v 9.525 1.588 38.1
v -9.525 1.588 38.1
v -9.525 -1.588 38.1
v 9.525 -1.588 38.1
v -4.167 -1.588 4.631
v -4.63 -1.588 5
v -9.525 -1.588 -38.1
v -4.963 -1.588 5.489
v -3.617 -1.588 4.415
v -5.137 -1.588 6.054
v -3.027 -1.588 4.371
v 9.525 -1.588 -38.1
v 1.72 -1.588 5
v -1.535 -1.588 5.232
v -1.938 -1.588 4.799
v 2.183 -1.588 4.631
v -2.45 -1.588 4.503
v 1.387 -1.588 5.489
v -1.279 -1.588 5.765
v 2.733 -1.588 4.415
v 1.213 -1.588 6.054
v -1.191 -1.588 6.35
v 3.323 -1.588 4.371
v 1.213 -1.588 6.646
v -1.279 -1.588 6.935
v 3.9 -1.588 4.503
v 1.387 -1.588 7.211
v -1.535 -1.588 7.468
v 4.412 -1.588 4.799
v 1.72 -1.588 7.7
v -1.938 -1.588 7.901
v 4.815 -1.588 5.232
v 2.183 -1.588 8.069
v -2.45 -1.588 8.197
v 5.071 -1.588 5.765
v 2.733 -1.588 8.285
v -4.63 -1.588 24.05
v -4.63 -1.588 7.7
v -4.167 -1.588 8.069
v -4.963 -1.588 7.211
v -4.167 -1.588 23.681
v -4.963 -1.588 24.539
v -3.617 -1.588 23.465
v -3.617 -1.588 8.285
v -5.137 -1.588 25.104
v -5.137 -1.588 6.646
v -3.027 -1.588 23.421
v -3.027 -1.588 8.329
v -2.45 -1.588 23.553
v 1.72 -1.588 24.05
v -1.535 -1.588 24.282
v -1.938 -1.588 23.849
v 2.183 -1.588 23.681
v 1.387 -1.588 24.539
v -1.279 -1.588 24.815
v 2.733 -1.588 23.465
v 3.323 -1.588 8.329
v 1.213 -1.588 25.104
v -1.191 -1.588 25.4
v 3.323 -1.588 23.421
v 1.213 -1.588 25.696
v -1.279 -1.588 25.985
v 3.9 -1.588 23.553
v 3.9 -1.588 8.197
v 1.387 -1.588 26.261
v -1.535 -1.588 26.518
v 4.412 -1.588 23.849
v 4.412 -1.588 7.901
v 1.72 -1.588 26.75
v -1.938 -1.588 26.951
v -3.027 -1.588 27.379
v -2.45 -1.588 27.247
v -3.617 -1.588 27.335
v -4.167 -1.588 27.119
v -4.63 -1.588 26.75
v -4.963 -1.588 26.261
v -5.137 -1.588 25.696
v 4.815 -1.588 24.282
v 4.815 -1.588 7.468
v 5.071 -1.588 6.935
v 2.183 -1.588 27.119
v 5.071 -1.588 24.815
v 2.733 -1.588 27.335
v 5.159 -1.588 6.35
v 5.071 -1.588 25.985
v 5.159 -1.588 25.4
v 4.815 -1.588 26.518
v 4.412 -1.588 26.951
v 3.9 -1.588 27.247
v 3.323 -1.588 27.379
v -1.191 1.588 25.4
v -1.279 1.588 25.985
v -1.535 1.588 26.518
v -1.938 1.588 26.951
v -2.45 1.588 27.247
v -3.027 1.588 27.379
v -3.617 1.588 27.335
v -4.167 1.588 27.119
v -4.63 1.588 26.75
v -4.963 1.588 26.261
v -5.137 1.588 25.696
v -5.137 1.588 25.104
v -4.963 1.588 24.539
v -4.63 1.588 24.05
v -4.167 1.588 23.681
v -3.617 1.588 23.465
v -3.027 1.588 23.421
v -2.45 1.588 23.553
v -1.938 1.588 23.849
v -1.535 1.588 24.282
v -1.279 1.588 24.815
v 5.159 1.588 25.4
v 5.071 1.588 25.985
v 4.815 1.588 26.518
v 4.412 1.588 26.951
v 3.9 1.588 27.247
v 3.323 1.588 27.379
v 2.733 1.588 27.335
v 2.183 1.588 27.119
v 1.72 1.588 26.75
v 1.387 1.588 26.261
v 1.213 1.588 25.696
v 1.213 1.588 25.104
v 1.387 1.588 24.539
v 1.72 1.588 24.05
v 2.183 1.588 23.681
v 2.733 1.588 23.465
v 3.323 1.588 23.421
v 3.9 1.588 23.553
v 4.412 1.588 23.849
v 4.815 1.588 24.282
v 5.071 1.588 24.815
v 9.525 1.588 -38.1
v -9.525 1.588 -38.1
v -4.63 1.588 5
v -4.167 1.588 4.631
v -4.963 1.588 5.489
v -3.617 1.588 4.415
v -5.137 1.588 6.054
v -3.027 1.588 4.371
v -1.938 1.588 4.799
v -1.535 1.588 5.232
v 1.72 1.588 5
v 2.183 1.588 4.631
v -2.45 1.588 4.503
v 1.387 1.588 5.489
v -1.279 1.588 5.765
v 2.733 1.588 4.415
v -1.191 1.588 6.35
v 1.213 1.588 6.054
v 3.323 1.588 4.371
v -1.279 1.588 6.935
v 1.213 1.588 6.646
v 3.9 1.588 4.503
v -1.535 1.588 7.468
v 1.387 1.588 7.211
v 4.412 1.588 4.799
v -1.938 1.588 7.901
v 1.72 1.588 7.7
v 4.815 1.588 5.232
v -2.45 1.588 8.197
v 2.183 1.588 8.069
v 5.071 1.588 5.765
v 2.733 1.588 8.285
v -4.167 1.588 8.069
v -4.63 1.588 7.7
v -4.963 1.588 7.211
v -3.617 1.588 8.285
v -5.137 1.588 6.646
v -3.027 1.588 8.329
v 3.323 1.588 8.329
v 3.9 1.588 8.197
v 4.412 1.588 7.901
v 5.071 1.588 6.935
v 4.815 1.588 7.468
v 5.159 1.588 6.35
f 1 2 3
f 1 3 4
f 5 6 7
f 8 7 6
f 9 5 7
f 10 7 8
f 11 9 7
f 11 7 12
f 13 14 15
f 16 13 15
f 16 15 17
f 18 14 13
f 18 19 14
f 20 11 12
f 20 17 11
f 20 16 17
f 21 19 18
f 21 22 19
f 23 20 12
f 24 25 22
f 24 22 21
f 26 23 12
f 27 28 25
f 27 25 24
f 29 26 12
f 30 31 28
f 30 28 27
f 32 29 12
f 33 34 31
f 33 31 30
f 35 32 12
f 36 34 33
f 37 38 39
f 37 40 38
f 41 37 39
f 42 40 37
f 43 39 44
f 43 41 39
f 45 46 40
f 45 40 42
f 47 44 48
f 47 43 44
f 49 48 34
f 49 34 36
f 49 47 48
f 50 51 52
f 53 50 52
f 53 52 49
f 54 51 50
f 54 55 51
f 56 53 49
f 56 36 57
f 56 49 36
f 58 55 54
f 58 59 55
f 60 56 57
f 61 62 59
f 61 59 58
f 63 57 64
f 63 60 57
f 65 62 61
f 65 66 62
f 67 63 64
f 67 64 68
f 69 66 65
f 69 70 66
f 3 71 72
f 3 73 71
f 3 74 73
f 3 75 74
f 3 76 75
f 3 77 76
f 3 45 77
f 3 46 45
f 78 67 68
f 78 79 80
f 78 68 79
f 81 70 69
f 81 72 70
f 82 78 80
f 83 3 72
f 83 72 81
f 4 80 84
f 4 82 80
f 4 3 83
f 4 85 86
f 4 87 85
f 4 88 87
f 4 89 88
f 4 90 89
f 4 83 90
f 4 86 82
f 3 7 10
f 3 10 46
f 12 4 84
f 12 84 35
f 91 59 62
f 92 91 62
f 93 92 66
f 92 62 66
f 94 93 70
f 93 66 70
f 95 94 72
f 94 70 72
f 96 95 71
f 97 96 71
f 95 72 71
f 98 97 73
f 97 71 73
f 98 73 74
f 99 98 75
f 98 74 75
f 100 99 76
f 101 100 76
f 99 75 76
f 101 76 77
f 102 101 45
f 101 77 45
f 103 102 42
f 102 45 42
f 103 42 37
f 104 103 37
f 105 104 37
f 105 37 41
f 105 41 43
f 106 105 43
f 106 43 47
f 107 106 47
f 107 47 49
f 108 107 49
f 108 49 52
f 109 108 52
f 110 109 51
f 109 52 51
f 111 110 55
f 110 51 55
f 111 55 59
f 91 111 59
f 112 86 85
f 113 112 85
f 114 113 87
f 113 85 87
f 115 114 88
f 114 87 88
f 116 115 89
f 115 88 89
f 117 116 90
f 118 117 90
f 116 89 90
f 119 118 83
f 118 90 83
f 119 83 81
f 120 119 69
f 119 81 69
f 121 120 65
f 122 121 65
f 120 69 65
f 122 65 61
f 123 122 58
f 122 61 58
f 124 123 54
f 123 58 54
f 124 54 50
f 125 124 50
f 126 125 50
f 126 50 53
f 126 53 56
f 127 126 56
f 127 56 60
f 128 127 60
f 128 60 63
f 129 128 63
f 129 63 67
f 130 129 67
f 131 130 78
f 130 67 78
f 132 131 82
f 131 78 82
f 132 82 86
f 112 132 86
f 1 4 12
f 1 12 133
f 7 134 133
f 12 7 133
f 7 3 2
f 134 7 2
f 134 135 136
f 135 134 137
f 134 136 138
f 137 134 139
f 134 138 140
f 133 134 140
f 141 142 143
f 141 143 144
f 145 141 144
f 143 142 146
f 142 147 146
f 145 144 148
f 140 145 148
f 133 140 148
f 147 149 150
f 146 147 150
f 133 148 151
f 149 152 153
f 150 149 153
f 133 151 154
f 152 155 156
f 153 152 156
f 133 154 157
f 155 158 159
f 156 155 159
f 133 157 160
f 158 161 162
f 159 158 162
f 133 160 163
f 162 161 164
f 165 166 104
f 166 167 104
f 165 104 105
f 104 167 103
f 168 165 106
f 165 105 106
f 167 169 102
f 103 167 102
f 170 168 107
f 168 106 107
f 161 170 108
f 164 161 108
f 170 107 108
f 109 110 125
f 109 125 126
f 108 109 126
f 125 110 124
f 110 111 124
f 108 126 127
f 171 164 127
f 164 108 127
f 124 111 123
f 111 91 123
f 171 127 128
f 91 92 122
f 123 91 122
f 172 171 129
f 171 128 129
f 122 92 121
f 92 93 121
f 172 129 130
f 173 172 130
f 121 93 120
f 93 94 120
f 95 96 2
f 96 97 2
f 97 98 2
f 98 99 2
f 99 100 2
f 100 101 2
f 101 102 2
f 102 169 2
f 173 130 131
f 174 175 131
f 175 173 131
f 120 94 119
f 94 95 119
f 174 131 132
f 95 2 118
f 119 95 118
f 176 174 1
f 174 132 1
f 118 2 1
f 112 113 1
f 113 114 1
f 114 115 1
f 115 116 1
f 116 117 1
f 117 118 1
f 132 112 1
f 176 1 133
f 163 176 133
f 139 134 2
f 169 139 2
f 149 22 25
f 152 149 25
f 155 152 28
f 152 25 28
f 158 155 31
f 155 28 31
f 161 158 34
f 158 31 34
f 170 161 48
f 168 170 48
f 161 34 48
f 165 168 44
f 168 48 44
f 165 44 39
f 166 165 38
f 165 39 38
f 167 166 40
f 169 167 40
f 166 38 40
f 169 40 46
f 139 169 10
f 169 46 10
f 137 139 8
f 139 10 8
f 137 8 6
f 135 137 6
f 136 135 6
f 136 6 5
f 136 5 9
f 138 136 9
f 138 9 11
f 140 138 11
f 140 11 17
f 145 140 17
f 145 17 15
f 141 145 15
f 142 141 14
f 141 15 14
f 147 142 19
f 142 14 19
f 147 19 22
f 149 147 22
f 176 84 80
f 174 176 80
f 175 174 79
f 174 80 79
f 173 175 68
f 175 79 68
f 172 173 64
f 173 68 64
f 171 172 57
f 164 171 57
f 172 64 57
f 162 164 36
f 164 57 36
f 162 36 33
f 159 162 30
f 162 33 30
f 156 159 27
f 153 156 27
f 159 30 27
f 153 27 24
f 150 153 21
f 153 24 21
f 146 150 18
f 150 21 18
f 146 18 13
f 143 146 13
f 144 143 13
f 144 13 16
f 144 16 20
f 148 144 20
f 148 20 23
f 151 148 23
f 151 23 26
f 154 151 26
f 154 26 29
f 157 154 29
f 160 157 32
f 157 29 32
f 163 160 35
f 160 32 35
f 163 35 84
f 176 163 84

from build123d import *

# Parameters (mm, degrees)
F0_W     = 19.05
F0_H     = 3.175
F1_DEPTH = 38.1
F2_R     = 1.984375
F3_DEPTH = 3.175


with BuildPart() as f1:
    # F0 (on Top) → F1 (new body, symmetric)
    with BuildSketch(Plane.XY):
        Rectangle(F0_W, F0_H)
    extrude(amount=F1_DEPTH, both=True)

    # F2 (on face) → F3 (cut, through all)
    with BuildSketch(Plane.XZ.offset(1.5875)):
        with Locations((3.175, 25.4)):
            Circle(F2_R)
        with Locations((-3.175, 25.4)):
            Circle(F2_R)
        with Locations((3.175, 6.35)):
            Circle(F2_R)
        with Locations((-3.175, 6.35)):
            Circle(F2_R)
    extrude(amount=-F3_DEPTH, mode=Mode.SUBTRACT)


solid = f1.part
